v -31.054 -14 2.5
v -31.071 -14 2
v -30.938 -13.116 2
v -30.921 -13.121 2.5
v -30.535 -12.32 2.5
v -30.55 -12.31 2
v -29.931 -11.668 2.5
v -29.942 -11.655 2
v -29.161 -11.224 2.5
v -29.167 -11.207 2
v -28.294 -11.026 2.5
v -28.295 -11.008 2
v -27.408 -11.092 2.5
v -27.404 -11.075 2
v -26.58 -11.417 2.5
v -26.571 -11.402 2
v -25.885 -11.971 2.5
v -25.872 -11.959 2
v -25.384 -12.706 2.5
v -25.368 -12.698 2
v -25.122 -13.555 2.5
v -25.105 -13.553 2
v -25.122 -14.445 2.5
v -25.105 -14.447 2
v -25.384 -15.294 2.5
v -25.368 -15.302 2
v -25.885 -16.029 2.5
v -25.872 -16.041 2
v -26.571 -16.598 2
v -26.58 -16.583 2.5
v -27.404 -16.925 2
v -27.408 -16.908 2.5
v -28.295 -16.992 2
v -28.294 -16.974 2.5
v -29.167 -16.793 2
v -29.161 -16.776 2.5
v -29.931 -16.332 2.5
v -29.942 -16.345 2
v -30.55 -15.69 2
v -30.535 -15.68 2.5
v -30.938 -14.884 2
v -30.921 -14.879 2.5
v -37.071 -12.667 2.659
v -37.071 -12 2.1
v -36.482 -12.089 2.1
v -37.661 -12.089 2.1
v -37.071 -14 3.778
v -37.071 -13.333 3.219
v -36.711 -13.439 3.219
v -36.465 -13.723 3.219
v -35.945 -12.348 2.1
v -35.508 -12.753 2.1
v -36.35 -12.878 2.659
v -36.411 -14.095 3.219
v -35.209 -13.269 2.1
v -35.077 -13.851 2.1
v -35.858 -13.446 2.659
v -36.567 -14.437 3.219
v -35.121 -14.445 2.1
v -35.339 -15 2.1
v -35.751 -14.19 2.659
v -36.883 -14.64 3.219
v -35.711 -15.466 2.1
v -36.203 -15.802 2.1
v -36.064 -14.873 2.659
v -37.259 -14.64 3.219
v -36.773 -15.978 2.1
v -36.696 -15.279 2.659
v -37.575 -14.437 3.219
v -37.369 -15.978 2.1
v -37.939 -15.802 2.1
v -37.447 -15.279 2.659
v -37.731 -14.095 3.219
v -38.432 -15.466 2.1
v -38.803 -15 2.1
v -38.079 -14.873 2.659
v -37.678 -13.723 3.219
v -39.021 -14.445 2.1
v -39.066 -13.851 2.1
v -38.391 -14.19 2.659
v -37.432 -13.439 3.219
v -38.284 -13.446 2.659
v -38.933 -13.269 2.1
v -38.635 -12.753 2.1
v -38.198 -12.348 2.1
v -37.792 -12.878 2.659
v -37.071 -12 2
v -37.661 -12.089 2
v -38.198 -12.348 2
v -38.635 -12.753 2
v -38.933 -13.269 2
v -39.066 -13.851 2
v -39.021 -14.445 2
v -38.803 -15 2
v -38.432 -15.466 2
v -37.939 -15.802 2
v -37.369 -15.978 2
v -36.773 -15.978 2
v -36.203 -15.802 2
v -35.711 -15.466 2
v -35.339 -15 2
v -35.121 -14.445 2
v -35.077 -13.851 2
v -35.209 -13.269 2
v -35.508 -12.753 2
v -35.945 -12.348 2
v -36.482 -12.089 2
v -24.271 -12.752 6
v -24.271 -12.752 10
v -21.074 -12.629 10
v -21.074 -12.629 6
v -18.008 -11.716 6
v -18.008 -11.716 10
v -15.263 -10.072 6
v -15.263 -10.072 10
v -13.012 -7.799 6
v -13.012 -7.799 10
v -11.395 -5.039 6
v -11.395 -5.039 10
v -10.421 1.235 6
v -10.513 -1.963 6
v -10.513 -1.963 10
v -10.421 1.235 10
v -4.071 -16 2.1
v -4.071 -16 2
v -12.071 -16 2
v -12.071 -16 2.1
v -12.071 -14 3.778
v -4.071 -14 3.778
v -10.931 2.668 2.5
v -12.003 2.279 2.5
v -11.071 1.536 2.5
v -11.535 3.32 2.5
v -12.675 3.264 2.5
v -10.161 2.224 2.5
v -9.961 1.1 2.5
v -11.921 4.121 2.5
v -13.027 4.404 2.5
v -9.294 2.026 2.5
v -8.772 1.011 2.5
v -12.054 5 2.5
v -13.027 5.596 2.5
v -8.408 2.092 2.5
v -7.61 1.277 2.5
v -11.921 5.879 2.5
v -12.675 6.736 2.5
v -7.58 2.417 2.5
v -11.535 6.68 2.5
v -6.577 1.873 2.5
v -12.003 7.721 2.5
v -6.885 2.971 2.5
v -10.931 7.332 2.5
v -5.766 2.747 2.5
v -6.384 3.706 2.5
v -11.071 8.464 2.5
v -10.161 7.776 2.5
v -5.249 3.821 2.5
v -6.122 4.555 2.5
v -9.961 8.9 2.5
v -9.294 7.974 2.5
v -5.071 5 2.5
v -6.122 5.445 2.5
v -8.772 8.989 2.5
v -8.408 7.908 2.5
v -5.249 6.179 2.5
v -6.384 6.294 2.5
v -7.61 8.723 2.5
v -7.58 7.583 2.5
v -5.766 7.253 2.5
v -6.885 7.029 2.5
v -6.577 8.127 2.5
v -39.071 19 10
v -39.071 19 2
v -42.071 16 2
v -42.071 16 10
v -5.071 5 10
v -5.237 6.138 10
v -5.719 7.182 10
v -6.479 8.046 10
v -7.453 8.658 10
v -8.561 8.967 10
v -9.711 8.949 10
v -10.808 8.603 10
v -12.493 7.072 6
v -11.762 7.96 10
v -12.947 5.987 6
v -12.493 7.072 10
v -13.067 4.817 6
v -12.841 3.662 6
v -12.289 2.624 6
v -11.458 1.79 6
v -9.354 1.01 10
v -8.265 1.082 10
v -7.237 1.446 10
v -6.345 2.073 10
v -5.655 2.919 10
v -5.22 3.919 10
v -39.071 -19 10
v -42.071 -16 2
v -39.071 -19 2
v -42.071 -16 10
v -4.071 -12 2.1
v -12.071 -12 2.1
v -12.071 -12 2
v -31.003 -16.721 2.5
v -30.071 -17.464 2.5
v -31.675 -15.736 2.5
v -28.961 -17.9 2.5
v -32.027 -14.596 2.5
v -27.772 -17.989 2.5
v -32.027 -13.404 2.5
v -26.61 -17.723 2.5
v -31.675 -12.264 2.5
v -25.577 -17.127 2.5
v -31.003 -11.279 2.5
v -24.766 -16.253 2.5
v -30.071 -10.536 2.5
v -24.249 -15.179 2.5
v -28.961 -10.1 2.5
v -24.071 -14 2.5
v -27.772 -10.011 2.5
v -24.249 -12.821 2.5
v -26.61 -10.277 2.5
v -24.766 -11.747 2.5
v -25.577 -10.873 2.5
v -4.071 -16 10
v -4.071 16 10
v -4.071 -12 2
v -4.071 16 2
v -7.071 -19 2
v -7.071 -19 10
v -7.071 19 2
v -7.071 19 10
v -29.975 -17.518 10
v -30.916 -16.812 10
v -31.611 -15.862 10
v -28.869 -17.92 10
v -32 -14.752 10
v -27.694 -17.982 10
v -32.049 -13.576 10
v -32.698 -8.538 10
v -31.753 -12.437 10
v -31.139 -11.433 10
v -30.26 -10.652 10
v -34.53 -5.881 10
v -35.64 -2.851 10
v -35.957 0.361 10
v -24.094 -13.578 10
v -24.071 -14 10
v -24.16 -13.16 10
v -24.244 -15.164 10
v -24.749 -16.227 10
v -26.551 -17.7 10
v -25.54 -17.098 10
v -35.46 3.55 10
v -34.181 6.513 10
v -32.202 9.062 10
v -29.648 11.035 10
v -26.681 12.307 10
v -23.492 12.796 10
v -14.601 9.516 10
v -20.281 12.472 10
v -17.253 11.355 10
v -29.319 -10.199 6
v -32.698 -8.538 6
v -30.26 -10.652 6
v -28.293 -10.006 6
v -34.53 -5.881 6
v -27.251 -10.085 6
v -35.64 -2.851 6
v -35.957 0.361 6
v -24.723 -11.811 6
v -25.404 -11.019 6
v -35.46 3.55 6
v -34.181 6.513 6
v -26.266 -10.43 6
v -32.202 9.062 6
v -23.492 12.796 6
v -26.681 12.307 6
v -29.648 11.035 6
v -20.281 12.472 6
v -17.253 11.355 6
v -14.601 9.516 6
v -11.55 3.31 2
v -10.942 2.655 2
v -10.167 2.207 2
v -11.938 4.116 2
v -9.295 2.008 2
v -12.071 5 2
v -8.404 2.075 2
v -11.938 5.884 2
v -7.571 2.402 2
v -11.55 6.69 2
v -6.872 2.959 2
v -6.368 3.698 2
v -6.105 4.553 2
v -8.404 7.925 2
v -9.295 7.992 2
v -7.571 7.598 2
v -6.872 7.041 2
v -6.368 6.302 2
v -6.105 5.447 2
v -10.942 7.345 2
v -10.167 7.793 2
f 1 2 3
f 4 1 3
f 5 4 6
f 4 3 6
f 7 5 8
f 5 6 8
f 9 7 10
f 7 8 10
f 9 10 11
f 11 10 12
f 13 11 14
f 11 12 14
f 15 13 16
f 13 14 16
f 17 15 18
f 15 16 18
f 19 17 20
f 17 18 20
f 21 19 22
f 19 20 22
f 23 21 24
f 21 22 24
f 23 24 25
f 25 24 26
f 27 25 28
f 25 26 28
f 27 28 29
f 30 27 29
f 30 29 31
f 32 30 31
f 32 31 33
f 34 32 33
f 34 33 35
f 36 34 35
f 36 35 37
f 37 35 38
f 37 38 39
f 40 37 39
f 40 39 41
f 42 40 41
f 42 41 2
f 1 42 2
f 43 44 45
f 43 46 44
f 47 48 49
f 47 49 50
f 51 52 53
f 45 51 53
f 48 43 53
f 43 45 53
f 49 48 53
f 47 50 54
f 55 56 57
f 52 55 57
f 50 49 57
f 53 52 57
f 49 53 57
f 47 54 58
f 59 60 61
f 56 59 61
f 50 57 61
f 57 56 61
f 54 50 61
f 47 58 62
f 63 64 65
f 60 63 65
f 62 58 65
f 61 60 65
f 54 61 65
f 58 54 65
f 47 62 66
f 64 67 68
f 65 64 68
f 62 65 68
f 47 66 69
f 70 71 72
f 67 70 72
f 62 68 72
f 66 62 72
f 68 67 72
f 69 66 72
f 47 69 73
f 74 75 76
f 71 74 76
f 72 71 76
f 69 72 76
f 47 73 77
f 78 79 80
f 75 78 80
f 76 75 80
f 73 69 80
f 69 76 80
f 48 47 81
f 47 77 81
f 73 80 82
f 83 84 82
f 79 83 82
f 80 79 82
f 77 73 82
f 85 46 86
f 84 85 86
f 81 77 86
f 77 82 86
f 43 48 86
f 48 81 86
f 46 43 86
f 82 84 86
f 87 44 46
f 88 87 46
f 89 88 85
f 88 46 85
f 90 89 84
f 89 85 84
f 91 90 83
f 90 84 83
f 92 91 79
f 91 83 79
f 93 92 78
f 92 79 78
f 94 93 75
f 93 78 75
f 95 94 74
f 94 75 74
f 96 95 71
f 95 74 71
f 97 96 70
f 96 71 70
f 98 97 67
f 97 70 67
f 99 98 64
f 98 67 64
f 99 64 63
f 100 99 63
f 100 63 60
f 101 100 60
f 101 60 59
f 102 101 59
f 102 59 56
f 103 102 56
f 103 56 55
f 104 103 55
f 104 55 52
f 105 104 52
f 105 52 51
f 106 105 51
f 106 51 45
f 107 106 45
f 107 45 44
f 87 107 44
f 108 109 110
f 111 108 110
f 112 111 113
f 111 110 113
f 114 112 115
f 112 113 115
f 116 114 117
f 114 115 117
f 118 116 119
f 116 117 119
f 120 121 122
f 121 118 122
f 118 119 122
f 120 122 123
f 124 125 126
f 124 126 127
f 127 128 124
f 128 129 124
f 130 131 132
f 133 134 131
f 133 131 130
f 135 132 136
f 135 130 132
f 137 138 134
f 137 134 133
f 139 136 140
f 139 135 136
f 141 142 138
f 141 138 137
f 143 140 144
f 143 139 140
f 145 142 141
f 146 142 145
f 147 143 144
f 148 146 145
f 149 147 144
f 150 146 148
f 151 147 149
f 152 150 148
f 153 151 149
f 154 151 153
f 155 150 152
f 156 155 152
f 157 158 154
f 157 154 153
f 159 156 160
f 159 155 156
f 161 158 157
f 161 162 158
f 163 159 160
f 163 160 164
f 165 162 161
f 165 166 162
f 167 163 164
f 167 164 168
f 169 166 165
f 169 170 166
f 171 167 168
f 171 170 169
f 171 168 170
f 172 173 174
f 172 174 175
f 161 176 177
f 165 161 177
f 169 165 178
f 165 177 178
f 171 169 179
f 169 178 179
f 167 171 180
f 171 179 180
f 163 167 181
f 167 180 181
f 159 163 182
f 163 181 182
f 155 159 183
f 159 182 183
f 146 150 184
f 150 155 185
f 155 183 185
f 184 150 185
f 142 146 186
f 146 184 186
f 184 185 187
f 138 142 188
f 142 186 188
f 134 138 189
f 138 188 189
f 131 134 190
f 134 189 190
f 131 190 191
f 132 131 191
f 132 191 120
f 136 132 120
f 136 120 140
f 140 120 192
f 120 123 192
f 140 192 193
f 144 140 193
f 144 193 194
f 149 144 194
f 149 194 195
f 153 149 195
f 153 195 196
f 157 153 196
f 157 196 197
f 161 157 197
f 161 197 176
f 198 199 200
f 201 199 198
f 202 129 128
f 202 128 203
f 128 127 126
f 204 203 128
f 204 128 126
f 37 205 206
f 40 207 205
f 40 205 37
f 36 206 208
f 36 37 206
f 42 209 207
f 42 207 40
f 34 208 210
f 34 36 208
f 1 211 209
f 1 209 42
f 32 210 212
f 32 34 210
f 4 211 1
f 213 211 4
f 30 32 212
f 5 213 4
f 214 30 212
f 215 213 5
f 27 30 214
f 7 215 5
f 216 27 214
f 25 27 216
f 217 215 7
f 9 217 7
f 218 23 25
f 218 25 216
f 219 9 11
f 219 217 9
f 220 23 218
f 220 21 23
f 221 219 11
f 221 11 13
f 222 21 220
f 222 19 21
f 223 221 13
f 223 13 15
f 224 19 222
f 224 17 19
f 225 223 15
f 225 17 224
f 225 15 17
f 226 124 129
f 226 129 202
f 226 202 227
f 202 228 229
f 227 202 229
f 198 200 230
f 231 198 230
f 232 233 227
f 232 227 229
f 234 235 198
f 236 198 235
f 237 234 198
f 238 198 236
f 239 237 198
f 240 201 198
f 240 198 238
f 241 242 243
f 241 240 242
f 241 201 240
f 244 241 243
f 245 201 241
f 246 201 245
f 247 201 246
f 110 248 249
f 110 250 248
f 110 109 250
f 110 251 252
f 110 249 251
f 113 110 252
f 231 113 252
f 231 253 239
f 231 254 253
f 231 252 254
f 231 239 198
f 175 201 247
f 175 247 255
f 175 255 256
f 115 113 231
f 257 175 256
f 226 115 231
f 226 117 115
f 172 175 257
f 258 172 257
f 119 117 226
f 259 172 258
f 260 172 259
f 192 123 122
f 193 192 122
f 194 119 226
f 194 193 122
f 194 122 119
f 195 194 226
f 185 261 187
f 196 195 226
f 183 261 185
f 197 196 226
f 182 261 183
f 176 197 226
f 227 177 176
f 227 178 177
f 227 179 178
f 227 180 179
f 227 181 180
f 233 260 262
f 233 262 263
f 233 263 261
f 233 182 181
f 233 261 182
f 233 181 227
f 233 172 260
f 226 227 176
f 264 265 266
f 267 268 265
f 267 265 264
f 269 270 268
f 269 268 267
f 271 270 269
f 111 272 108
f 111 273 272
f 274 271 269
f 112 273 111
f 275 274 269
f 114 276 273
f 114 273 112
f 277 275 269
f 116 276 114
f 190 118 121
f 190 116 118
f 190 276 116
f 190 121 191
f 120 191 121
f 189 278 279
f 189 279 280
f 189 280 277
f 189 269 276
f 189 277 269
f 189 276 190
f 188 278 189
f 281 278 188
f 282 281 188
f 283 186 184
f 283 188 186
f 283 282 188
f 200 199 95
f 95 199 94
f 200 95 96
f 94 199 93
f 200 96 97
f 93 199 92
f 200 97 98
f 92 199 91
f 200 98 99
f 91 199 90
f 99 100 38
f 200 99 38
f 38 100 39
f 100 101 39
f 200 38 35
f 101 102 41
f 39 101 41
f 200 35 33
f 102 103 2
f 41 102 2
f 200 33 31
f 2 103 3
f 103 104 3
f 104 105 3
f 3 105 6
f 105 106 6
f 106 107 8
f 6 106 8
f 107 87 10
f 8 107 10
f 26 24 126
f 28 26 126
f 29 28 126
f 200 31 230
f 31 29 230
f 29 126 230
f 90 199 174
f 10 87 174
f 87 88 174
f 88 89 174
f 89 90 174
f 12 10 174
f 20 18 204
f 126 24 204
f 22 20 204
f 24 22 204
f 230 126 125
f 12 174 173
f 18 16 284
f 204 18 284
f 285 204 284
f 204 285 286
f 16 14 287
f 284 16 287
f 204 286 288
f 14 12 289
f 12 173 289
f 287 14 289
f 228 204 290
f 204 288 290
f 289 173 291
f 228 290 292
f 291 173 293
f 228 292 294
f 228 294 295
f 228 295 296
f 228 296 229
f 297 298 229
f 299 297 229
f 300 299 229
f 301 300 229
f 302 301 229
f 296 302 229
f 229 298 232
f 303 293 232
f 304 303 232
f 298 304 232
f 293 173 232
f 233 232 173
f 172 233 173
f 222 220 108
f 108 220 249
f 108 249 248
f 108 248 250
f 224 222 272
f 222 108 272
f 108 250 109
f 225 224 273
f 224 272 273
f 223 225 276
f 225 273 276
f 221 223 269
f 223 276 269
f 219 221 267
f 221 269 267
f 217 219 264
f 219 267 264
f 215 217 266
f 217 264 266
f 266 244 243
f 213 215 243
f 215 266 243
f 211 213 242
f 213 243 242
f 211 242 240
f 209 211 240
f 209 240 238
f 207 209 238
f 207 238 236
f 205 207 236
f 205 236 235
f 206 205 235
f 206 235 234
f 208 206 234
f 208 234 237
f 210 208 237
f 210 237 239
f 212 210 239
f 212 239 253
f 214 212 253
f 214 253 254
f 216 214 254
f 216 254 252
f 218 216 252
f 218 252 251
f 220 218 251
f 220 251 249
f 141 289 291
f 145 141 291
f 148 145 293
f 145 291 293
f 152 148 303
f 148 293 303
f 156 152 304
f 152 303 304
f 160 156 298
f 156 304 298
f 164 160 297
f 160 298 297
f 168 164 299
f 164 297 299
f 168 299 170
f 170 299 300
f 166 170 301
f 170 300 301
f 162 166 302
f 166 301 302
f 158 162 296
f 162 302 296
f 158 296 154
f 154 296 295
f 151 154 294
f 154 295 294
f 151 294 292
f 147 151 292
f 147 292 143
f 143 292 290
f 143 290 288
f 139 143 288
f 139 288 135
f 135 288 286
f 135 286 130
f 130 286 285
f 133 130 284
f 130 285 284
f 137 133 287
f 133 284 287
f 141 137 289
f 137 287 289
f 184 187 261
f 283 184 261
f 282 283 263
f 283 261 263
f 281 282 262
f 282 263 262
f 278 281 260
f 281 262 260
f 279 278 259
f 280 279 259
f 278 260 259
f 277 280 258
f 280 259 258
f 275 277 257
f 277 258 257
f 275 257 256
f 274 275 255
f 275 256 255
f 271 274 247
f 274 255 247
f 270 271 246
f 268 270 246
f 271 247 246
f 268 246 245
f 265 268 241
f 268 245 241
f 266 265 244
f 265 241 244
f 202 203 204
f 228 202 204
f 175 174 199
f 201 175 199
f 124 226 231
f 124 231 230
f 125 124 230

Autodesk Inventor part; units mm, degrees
ref_plane "YZ Plane" through (0, 0, 0) normal (1, 0, 0) x (0, 1, 0)
ref_plane "XZ Plane" through (0, 0, 0) normal (0, 1, 0) x (-1, 0, 0)
ref_plane "XY Plane" through (0, 0, 0) normal (0, 0, 1) x (1, 0, 0)
ref_plane "Work Plane1" through (0, 0, 2) normal (0, 0, 1) x (1, 0, 0)
sketch "Sketch1" plane through (0, 0, 2) normal (0, 0, 1) x (1, 0, 0)
  line L0 (-37.0712, 14) -> (-9.0712, 14) construction
  line L1 (-9.0712, 14) -> (-9.0712, -14) construction
  line L2 (-9.0712, -14) -> (-37.0712, -14) construction
  line L3 (-37.0712, -14) -> (-37.0712, 14) construction
  line L4 (-4.0712, -19) -> (-4.0712, 19)
  line L5 (-4.0712, 19) -> (-42.0712, 19)
  line L6 (-42.0712, 19) -> (-42.0712, -19)
  line L7 (-42.0712, -19) -> (-4.0712, -19)
  circle A0 centre (-23.0712, 0) radius 12.8
  point P0 (0, 0)
  dimension "d0" = 5
extrude "Extrusion1" add sketch "Sketch1" along normal blind 8 contours L7 L6 L5 L4 | A0
sketch "Sketch3" plane through (0, 0, 2) normal (0, 0, -1) x (-1, 0, 0)
  circle A0 centre (9.0712, -14) radius 1.45 construction
  circle A1 centre (9.0712, -14) radius 2.45
  circle A2 centre (37.0712, -14) radius 1.45 projected
  circle A3 centre (37.0712, -14) radius 1.95
  point P0 (0, 0)
  dimension "d8" = 1
  dimension "d10" = 0.5
chamfer "Chamfer1" distance 3 angle 45 4 edges at (-42.0712, 19, 6) (-4.0712, 19, 6) (-4.0712, -19, 6) (-42.0712, -19, 6)
hole "Hole1" at (-37.0712, -14, 2) direction (0, 0, 1) diameter 4 depth 0.1 tip angle 100
sketch "Sketch4" plane through (-4.0712, -19, 2) normal (1, 0, 0) x (0, 0, -1)
  line L0 (2, 4.45) -> (6, 4.45)
  line L1 (2, 1.55) -> (6, 1.55)
  line L2 (0, 0) -> (0, 38) projected
  arc A0 (2, 19) -> (2, 19) centre (1.5, 4.4206) ccw projected
  line L3 (-1.7782, 5) -> (-0.1, 7) projected
  line L4 (-1.7782, 5) -> (-0.1, 3) projected
  line L5 (-0.1, 7) -> (0.6045, 7)
  line L6 (0.6045, 7) -> (0.6045, 3)
  line L7 (0.6045, 3) -> (-0.1, 3)
  line L8 (-0.1, 3) -> (-0.1, 7)
extrude "Extrusion4" cut sketch "Sketch4" against normal blind 8 contours L7 L8 L5 L2 | L2 L5 L6 L7 | L4 L3 L8
ref_plane "Arbeitsebene2" through (-23.0712, -12, 2) normal (1, 0, 0) x (0, 0, -1)
ref_plane "Arbeitsebene3" through (-39.0712, 0, 2) normal (0, -1, 0) x (1, 0, 0)
sketch "Skizze9" plane through (0, 0, 2) normal (0, 0, -1) x (-1, 0, 0)
  line L0 (12.0712, -16) -> (4.0712, -16) projected
  line L1 (7.0712, -19) -> (4.0712, -16) projected
  line L2 (39.0712, -19) -> (7.0712, -19) projected
  line L3 (42.0712, -16) -> (39.0712, -19) projected
  line L4 (42.0712, 16) -> (42.0712, -16) projected
  line L5 (39.0712, 19) -> (42.0712, 16) projected
  line L6 (7.0712, 19) -> (39.0712, 19) projected
  line L7 (4.0712, 16) -> (7.0712, 19) projected
  line L8 (4.0712, -12) -> (4.0712, 16) projected
  line L9 (4.0712, -12) -> (12.0712, -12) projected
  line L10 (12.0712, -12) -> (12.0712, -16) projected
  circle A0 centre (37.0712, -14) radius 2 projected
  circle A1 centre (28.0712, -14) radius 3
  circle A2 centre (9.0712, 5) radius 3
  point P0 (0, 0)
  dimension "d54" = 6
  dimension "d55" = 6
  dimension "d56" = 14
  dimension "d57" = 5
  dimension "d58" = 5
  dimension "d59" = 14
extrude "Extrusion9" cut sketch "Skizze9" against normal blind 3 draft -2 contours A1 | A2
sketch "Skizze10" plane through (0, 0, 10) normal (0, 0, 1) x (1, 0, 0)
  circle A0 centre (-9.0712, 5) radius 4.05 projected
  circle A1 centre (-28.0712, -14) radius 4.55 projected
  circle A2 centre (-9.0712, 5) radius 4
  circle A3 centre (-28.0712, -14) radius 2.8952 projected
  circle A4 centre (-28.0712, -14) radius 4
  point P0 (0, 0)
  dimension "d62" = 8
  dimension "d63" = 8
extrude "Extrusion10" cut sketch "Skizze10" against normal blind 7.5 contours A2 | A3 | A4
sketch "Skizze11" plane through (0, 0, 10) normal (0, 0, 1) x (1, 0, 0)
  circle A0 centre (-28.0712, -14) radius 4 projected
  circle A1 centre (-9.0712, 5) radius 4 projected
  line L0 (-39.0712, -19) -> (-42.0712, -16) projected
  line L1 (-39.0712, -19) -> (-7.0712, -19) projected
  line L2 (-4.0712, -16) -> (-7.0712, -19) projected
  line L3 (-4.0712, -16) -> (-4.0712, 16) projected
  line L4 (-7.0712, 19) -> (-4.0712, 16) projected
  line L5 (-7.0712, 19) -> (-39.0712, 19) projected
  line L6 (-42.0712, 16) -> (-39.0712, 19) projected
  line L7 (-42.0712, 16) -> (-42.0712, -16) projected
  circle A2 centre (-23.1616, 0) radius 12.8
  point P0 (0, 0)
  dimension "d66" = 25.6
extrude "Extrusion11" cut sketch "Skizze11" against normal blind 4 contours A2 A0 | A0 A2 A1 | A2 A1 picked at (-27.171, -11.4329) picked at (-11.706, 4.065)
equation "\"d54\" = d55"
equation "\"d59\" = d56"
properties part number "20_Cube_Insert_Kinematic_Thorlabs_1inch_pro_magnetic"
